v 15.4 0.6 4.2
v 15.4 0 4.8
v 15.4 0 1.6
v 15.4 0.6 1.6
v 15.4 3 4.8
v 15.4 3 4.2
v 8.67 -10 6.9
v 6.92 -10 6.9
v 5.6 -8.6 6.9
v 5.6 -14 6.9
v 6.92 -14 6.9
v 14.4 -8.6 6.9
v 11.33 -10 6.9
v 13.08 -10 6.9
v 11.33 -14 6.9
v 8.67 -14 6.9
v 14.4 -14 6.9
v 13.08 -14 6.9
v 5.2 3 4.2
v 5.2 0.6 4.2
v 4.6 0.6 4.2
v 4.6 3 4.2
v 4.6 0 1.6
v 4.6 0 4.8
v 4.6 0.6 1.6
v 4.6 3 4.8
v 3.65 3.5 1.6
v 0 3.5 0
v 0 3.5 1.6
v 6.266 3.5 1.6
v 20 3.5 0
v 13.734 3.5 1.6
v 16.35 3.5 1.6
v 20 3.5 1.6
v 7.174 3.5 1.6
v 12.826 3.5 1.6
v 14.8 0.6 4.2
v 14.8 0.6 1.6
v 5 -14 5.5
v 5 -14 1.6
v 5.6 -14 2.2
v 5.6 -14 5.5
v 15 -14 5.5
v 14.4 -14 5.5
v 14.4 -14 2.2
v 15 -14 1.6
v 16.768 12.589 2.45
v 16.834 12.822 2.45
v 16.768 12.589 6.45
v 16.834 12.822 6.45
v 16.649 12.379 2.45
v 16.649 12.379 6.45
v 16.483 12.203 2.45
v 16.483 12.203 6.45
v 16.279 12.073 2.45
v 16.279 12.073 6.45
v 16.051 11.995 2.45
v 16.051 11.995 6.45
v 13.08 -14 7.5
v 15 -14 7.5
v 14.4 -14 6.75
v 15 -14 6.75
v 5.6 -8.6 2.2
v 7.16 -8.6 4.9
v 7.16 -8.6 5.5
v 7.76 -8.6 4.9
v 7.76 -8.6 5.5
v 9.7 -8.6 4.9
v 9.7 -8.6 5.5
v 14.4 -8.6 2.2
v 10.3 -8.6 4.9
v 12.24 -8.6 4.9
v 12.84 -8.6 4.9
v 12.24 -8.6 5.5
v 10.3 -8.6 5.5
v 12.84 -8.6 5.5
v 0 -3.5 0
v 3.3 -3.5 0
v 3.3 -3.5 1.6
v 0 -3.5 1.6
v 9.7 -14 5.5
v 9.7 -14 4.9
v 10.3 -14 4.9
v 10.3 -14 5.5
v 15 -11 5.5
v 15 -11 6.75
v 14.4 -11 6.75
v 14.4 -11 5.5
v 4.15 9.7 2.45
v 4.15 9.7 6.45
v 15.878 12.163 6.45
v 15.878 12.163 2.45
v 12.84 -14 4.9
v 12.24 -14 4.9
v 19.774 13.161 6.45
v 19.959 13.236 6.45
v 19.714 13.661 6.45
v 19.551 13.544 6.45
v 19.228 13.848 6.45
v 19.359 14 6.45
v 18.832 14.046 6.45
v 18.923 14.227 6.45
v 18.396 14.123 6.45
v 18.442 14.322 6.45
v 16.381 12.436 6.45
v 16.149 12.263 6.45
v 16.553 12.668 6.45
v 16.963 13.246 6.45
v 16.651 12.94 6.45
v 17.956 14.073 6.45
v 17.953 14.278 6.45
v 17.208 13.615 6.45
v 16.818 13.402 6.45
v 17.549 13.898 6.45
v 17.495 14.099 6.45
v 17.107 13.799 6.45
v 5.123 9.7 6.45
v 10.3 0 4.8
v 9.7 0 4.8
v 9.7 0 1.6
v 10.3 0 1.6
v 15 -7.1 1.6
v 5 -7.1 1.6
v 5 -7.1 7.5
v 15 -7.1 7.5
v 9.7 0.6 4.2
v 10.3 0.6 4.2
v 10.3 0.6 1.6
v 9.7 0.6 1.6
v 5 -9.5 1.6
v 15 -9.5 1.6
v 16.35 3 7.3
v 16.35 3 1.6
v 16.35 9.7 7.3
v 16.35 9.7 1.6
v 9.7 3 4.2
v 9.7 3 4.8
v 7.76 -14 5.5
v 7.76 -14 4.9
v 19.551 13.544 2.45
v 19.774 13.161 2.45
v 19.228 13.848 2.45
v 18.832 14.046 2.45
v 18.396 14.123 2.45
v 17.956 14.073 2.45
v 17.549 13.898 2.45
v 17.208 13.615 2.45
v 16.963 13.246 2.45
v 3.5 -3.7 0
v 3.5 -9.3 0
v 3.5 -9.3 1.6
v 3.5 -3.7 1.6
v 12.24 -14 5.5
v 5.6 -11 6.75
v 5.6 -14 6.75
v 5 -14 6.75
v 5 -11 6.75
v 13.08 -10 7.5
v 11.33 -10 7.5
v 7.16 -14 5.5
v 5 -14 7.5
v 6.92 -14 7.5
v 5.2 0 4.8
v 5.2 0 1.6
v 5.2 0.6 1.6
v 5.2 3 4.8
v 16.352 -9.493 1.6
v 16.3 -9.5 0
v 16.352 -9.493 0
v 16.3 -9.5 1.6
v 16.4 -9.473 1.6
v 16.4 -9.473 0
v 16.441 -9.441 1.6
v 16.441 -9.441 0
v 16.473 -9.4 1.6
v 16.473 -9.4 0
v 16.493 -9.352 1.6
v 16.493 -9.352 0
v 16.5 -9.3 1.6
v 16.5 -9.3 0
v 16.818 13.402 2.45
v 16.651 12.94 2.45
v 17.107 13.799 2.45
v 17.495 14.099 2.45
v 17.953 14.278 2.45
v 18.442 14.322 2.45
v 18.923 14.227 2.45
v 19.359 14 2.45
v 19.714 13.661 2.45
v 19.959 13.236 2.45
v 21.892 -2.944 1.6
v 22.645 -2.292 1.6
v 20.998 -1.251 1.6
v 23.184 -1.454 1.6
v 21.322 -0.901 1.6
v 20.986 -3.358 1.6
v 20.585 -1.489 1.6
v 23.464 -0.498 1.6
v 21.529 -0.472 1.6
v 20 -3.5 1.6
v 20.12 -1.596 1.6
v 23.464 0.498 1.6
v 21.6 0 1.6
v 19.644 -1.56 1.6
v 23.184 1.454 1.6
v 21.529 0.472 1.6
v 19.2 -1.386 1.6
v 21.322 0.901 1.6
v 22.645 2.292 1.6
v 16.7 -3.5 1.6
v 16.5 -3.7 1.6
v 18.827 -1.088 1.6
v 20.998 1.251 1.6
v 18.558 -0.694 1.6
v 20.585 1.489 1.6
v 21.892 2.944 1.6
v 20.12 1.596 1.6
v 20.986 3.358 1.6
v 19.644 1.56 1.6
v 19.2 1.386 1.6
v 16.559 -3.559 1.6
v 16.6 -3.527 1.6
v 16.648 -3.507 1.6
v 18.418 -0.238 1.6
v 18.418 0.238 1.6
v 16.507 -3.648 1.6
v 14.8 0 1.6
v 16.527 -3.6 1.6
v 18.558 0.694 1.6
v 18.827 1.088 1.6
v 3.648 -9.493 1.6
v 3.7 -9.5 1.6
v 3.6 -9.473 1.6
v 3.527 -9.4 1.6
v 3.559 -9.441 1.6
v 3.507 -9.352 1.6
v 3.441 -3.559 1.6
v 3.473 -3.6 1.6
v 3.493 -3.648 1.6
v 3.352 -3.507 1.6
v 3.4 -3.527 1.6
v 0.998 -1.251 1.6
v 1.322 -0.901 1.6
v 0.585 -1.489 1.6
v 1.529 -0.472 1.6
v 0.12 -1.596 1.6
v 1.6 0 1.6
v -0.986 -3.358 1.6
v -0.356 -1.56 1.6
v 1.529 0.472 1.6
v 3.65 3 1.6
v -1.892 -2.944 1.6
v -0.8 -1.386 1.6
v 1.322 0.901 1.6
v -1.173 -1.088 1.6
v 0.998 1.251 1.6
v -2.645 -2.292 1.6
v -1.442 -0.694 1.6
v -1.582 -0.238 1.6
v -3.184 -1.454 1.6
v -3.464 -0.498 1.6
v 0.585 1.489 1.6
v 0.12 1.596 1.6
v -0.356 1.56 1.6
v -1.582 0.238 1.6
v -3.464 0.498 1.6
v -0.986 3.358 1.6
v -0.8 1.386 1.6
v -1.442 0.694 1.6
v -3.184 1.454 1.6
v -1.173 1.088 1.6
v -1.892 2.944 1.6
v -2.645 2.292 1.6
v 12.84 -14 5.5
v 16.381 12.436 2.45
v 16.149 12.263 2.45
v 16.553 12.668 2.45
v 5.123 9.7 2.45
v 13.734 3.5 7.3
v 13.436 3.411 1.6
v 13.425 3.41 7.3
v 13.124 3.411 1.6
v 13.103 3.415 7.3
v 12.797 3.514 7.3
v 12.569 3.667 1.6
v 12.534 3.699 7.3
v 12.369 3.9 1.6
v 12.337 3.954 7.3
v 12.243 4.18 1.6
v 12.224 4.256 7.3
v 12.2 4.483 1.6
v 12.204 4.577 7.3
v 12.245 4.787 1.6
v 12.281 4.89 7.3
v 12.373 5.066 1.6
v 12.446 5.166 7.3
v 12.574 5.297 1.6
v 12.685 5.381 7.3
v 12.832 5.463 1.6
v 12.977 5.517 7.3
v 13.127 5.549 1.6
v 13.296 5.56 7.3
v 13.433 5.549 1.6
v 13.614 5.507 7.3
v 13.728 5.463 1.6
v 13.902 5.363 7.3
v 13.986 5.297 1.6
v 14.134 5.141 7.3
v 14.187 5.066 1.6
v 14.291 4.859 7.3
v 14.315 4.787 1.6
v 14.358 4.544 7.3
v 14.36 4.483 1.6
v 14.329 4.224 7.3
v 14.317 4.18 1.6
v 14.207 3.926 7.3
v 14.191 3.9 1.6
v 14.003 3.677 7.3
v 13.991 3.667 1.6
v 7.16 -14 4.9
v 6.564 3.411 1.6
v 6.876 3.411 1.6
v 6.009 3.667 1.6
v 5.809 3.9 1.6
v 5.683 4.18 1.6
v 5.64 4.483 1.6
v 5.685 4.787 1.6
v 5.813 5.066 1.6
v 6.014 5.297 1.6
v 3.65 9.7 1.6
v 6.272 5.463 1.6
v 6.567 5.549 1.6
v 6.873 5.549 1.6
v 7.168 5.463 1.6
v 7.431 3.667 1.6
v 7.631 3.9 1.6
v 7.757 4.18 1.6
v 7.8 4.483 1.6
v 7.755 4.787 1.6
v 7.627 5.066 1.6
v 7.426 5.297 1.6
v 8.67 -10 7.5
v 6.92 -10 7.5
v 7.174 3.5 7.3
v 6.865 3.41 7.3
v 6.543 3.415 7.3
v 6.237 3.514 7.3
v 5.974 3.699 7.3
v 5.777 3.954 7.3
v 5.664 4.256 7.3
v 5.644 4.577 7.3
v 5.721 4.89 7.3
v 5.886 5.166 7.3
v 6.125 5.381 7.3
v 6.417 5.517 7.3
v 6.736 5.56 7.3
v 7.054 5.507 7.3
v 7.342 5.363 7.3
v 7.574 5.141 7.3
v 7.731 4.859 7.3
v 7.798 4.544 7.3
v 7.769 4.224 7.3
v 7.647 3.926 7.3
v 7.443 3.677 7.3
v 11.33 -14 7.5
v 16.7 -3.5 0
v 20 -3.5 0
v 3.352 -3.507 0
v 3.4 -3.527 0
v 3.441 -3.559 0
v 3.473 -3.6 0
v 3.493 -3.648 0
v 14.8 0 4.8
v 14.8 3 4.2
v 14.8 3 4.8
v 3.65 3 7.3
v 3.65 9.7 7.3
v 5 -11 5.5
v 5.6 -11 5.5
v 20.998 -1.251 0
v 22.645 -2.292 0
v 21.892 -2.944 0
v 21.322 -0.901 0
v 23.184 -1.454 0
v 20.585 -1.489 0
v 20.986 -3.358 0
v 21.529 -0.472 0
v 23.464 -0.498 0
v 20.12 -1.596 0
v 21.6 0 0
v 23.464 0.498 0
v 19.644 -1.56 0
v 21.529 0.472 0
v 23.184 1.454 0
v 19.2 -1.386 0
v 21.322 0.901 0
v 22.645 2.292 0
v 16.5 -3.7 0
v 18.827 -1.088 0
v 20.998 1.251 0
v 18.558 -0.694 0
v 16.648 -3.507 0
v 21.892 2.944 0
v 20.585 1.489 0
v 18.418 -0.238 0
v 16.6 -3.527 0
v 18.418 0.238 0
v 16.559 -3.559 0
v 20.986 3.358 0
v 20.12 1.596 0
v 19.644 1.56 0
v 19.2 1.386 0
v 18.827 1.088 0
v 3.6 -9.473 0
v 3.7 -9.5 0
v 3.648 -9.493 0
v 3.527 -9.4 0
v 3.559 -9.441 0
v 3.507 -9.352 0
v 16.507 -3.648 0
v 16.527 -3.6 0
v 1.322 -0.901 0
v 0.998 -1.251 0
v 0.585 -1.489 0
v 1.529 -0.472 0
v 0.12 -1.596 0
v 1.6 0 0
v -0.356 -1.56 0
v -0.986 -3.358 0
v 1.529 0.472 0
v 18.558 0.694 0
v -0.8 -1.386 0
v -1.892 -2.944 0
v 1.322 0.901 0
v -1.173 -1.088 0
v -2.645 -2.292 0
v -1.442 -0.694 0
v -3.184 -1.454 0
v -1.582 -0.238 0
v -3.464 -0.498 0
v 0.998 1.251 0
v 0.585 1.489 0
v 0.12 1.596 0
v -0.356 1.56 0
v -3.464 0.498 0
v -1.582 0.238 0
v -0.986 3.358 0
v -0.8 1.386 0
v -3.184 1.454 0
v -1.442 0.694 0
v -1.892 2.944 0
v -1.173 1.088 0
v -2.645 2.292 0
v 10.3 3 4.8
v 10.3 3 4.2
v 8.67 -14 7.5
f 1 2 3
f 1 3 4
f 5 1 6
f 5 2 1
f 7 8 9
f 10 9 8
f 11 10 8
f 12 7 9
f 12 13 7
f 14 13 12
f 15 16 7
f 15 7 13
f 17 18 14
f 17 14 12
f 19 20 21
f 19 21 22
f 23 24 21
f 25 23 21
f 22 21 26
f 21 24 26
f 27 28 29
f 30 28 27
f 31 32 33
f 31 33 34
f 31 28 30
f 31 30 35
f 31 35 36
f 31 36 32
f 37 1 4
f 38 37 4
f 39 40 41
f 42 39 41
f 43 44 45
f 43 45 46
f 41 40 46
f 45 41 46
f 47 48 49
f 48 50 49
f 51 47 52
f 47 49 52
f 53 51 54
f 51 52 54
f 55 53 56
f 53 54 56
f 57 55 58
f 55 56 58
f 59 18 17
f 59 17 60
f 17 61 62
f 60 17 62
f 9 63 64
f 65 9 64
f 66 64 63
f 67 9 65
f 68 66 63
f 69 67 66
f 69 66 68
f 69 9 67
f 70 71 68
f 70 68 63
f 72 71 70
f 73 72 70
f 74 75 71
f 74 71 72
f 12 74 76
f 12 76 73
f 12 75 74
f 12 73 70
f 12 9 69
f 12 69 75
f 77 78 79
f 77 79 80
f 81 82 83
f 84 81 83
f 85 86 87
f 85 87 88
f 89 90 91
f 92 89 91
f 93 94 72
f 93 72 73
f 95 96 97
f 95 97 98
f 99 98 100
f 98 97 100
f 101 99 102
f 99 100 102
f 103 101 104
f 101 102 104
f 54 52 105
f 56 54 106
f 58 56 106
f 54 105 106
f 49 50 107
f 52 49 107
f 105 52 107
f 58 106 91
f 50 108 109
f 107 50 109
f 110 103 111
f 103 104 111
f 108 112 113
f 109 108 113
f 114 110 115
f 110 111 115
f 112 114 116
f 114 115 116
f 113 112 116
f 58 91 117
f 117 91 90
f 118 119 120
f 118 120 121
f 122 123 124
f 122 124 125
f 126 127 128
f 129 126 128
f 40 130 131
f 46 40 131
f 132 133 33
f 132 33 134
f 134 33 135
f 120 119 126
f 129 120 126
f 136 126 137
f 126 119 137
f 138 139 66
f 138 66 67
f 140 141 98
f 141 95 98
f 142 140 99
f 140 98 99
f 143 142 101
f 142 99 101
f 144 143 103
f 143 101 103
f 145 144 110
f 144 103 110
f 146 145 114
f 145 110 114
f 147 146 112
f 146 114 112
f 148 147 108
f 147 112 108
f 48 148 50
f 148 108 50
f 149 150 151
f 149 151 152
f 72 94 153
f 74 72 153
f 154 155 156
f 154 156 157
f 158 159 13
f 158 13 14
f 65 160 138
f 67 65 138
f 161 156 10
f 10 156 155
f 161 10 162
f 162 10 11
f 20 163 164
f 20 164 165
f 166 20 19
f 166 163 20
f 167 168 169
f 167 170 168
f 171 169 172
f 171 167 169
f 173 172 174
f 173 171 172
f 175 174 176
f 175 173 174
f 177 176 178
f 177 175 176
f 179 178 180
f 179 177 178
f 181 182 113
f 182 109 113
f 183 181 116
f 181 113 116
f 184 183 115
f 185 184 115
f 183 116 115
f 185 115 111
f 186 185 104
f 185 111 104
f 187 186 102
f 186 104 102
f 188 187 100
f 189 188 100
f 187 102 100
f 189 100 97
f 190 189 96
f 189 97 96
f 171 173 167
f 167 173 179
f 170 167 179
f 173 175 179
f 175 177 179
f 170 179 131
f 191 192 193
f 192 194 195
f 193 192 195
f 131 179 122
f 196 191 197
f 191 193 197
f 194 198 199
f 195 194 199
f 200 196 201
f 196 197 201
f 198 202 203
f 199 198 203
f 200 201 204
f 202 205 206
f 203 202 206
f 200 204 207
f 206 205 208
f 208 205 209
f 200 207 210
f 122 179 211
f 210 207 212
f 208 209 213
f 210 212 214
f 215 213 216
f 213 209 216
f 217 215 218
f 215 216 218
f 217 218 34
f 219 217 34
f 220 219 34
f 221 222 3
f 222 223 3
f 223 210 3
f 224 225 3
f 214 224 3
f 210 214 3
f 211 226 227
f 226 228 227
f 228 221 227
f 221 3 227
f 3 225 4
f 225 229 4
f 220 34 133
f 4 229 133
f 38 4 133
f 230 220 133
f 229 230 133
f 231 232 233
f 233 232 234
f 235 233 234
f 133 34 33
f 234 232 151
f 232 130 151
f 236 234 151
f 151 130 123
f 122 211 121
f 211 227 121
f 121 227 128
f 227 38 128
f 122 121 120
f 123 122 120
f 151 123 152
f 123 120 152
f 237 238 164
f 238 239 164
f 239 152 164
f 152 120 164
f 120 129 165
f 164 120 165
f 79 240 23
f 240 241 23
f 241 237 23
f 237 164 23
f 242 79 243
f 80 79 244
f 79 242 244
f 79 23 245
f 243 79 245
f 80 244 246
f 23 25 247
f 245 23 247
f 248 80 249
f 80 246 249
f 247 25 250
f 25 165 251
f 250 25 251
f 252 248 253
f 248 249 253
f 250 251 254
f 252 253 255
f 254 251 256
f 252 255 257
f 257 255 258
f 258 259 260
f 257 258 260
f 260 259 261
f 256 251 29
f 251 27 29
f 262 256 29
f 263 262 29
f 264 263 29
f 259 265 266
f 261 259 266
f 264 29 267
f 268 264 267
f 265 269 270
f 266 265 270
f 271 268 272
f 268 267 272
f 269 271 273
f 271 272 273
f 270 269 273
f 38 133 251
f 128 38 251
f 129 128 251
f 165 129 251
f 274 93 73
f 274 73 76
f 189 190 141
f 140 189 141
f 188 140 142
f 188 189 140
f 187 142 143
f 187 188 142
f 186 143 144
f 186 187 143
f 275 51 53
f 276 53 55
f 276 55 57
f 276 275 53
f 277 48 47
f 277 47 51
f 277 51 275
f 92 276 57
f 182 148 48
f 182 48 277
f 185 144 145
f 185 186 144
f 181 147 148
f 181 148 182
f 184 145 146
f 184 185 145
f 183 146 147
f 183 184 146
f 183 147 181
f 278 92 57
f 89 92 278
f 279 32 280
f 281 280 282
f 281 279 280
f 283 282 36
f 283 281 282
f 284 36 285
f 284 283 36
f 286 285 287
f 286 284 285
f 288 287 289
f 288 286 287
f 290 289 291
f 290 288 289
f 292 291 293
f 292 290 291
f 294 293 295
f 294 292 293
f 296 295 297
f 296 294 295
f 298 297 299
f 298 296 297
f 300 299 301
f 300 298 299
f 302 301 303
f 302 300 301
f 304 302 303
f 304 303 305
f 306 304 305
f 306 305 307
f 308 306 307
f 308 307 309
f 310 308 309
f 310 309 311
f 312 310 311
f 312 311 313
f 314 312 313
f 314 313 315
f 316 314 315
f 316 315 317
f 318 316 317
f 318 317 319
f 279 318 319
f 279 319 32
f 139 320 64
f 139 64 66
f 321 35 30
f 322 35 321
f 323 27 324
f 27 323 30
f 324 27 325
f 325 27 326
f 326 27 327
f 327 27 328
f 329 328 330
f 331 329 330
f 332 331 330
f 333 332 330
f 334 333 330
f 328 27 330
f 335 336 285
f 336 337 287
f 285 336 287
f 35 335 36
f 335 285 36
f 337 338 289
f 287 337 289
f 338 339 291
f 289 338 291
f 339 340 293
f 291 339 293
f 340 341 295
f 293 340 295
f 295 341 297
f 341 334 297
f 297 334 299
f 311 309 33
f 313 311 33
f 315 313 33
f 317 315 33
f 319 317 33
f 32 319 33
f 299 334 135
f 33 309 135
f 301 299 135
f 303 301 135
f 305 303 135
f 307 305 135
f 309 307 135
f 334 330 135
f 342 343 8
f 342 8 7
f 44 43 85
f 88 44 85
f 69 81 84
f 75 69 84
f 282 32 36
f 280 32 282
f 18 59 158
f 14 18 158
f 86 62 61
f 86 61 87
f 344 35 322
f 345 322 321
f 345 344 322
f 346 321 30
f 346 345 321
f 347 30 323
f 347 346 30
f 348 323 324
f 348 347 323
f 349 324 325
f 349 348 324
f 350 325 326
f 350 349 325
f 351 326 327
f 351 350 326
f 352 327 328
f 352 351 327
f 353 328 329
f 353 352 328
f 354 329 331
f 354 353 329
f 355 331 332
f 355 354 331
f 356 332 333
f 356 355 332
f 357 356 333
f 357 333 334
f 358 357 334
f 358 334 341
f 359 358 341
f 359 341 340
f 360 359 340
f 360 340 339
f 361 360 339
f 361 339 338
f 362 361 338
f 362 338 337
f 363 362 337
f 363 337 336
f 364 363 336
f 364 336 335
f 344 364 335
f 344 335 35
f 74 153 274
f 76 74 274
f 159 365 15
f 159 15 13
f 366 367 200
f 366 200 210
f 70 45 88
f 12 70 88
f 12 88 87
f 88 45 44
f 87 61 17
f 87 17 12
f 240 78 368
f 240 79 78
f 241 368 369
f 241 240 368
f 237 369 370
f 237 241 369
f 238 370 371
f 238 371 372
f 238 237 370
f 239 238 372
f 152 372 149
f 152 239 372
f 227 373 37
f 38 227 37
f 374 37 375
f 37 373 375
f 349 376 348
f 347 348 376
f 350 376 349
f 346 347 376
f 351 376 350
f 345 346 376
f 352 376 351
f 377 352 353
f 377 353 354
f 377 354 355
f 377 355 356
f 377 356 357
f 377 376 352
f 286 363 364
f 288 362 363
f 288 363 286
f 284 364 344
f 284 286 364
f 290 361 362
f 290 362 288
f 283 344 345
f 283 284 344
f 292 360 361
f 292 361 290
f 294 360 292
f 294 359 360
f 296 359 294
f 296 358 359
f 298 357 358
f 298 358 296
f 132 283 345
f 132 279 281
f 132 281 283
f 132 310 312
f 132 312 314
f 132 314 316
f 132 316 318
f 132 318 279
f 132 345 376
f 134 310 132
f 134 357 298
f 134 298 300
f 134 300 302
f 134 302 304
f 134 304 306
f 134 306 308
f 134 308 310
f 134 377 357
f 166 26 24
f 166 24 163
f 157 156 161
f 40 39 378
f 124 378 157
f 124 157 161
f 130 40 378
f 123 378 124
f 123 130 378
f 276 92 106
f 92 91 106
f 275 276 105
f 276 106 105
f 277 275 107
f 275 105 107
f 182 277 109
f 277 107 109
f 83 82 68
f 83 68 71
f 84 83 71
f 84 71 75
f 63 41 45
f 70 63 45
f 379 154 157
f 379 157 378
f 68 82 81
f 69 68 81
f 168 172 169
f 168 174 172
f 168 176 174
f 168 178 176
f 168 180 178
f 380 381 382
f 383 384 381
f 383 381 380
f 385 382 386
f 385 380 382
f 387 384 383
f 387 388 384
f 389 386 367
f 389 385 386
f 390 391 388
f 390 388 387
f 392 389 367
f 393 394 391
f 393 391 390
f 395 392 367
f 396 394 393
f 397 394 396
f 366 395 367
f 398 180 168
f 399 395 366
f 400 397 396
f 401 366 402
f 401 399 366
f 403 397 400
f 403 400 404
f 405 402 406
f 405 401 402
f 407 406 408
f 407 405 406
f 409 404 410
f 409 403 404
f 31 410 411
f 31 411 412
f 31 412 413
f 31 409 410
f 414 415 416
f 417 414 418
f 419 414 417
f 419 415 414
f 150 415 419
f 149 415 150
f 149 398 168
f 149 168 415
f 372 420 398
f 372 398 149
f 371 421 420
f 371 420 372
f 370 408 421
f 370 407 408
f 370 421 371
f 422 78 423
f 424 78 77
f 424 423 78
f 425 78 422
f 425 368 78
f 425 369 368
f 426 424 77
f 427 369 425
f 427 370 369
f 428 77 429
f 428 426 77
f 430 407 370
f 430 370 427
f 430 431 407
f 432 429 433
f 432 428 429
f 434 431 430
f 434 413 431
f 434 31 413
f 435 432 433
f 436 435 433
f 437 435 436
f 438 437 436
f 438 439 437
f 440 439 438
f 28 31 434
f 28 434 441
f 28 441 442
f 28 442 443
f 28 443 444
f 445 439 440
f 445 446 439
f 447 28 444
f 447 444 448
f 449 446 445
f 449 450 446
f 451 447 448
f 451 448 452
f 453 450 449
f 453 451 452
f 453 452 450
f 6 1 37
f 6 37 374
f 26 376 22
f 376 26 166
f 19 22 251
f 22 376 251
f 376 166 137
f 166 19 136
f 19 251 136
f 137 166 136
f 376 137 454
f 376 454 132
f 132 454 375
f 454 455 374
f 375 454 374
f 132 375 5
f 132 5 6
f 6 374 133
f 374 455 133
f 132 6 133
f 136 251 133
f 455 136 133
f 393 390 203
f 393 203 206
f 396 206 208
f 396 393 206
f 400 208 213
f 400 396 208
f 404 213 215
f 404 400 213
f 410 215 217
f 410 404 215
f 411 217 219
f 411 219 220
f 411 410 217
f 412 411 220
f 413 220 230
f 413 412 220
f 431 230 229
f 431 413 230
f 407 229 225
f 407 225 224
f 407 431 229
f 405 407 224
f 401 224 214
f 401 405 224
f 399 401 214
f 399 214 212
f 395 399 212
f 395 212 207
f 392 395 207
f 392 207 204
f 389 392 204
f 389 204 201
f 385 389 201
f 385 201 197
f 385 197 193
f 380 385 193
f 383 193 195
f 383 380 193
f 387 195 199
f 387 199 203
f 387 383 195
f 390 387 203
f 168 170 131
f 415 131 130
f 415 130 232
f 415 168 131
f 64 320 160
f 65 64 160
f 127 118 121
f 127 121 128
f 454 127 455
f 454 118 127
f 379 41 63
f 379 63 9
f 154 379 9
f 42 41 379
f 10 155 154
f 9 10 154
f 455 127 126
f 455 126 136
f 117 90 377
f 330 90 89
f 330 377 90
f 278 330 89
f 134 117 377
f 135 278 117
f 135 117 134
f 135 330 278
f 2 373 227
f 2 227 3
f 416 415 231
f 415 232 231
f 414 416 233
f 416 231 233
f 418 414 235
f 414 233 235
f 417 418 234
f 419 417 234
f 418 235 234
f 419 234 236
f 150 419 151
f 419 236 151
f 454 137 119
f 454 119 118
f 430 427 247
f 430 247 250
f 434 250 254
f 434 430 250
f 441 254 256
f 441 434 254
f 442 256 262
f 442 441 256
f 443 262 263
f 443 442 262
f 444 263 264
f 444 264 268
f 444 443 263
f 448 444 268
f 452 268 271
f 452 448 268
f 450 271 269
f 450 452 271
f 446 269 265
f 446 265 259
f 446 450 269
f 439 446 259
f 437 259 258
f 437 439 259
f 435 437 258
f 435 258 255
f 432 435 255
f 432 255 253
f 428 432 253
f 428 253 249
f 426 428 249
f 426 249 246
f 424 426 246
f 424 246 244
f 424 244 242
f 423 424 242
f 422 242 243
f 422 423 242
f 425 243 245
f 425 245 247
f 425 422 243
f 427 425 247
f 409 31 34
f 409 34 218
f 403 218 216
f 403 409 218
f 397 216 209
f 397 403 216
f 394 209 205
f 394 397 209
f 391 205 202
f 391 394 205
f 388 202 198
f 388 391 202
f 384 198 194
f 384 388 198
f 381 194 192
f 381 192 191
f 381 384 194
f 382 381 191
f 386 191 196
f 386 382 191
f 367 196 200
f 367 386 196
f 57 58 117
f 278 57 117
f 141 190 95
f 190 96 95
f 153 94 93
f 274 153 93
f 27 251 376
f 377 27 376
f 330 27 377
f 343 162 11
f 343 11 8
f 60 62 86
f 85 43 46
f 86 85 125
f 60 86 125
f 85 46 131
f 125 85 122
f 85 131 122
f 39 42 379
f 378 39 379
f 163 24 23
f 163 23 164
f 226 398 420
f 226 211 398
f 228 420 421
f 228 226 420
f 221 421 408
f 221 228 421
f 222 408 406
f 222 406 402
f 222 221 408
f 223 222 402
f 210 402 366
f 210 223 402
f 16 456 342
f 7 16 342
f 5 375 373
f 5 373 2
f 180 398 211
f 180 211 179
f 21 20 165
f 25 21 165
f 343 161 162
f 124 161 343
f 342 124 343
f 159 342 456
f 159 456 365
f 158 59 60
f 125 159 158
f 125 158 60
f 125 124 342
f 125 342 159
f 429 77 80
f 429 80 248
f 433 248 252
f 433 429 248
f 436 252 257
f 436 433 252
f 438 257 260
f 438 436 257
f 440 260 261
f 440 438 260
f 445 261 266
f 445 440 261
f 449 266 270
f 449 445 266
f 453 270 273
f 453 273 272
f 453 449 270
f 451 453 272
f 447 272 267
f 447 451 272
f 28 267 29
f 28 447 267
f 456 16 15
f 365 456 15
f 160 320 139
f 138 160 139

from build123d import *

# Parameters (mm, degrees)
SKICA1_R                 = 1.6
P_IDAT_VYSUNUT_M1_DEPTH  = 1.6
SKICA2_W                 = 12.7
SKICA2_H                 = 6.7
P_IDAT_VYSUNUT_M2_DEPTH  = 5.7
SKICA3_W                 = 10
SKICA3_H                 = 6.9
P_IDAT_VYSUNUT_M3_DEPTH  = 5.9
SKICA4_W                 = 8.8
SKICA4_H                 = 4.7
SKICA4_W_2               = 0.6
SKICA4_H_2               = 0.6
ODEBRAT_VYSUNUT_M1_DEPTH = 5.4
SKICA5_W                 = 1.25
SKICA5_H                 = 3
ODEBRAT_VYSUNUT_M2_DEPTH = 11.4
SKICA6_W                 = 1.75
SKICA6_H                 = 4
ODEBRAT_VYSUNUT_M3_DEPTH = 1
ZAOBLIT1_R               = 0.2
SKICA8_R                 = 1.08
ODEBRAT_VYSUNUT_M4_DEPTH = 5.7
P_IDAT_VYSUNUT_M4_DEPTH  = 2
SKICA16_W                = 0.6
SKICA16_H                = 3
P_IDAT_VYSUNUT_M5_DEPTH  = 3.2
SKICA17_W                = 2.6
SKICA17_H                = 2.4
ODEBRAT_VYSUNUT_M6_DEPTH = 12


with BuildPart() as part:
    # Skica1 → Přidat vysunutím1 (new body)
    with BuildSketch(Plane.XY):
        with BuildLine():
            Line((0, 3.5), (20, 3.5))
            ThreePointArc((20, 3.5), (23.5, 0), (20, -3.5))
            Line((20, -3.5), (16.5, -3.5))
            Line((16.5, -3.5), (16.5, -9.5))
            Line((16.5, -9.5), (3.5, -9.5))
            Line((3.5, -9.5), (3.5, -3.5))
            Line((3.5, -3.5), (0, -3.5))
            ThreePointArc((0, -3.5), (-3.5, 0), (0, 3.5))
        make_face()
        Circle(SKICA1_R, mode=Mode.SUBTRACT)
        with Locations((20, 0)):
            Circle(SKICA1_R, mode=Mode.SUBTRACT)
    extrude(amount=P_IDAT_VYSUNUT_M1_DEPTH)

    # Skica2 → Přidat vysunutím2 (add)
    with BuildSketch(Plane.XY.offset(1.6)):
        with Locations((10, 6.35)):
            Rectangle(SKICA2_W, SKICA2_H)
    extrude(amount=P_IDAT_VYSUNUT_M2_DEPTH)

    # Skica3 → Přidat vysunutím3 (add)
    with BuildSketch(Plane.XY.offset(1.6)):
        with Locations((10, -10.55)):
            Rectangle(SKICA3_W, SKICA3_H)
    extrude(amount=P_IDAT_VYSUNUT_M3_DEPTH)

    # Skica4 → Odebrat vysunutím1 (cut)
    with BuildSketch(Plane.XZ.offset(14)):
        with Locations((10, 4.55)):
            Rectangle(SKICA4_W, SKICA4_H)
        with Locations((10, 5.2)):
            Rectangle(SKICA4_W_2, SKICA4_H_2, mode=Mode.SUBTRACT)
        with Locations((7.46, 5.2)):
            Rectangle(SKICA4_W_2, SKICA4_H_2, mode=Mode.SUBTRACT)
        with Locations((12.54, 5.2)):
            Rectangle(SKICA4_W_2, SKICA4_H_2, mode=Mode.SUBTRACT)
    extrude(amount=-ODEBRAT_VYSUNUT_M1_DEPTH, mode=Mode.SUBTRACT)

    # Skica5 → Odebrat vysunutím2 (cut)
    with BuildSketch(Plane(origin=(15, 0, 0), x_dir=(0, 0, -1), z_dir=(1, 0, 0))):
        with Locations((-6.125, -12.5)):
            Rectangle(SKICA5_W, SKICA5_H)
    extrude(amount=-ODEBRAT_VYSUNUT_M2_DEPTH, mode=Mode.SUBTRACT)

    # Skica6 → Odebrat vysunutím3 (cut)
    with BuildSketch(Plane.XY.offset(7.5)):
        with Locations((12.205, -12)):
            Rectangle(SKICA6_W, SKICA6_H)
        with Locations((7.795, -12)):
            Rectangle(SKICA6_W, SKICA6_H)
    extrude(amount=-ODEBRAT_VYSUNUT_M3_DEPTH, mode=Mode.SUBTRACT)

    # Zaoblit1
    zaoblit1_edges = [part.edges().sort_by_distance(p)[0] for p in [
        (16.5, -3.5, 0.8),
        (16.5, -9.5, 0.8),
        (3.5, -9.5, 0.8),
        (3.5, -3.5, 0.8),
    ]]
    fillet(zaoblit1_edges, radius=ZAOBLIT1_R)

    # Skica8 → Odebrat vysunutím4 (cut)
    with BuildSketch(Plane(origin=(0, -2.8, 7.3), x_dir=(1, 0, 0), z_dir=(0, 0, -1))):
        with Locations(Location((6.72, -7.28, 0), (0, 0, 65.14949766))):
            Circle(SKICA8_R)
        with Locations(Location((13.28, -7.28, 0), (0, 0, 65.14949766))):
            Circle(SKICA8_R)
    extrude(amount=ODEBRAT_VYSUNUT_M4_DEPTH, mode=Mode.SUBTRACT)

    # Skica15 → Přidat vysunutím4 (add, symmetric)
    with BuildSketch(Plane.XY.offset(4.45)):
        with BuildLine():
            Line((4.15, 9.7), (15.877570704, 12.162837052))
            ThreePointArc((15.877570704, 12.162837052), (16.38053334, 12.435762524), (16.651496116, 12.939785241))
            ThreePointArc((16.651496116, 12.939785241), (18.195492273, 14.317249988), (19.959455422, 13.23569219))
            Line((19.959455422, 13.23569219), (19.773836138, 13.161224202))
            ThreePointArc((19.773836138, 13.161224202), (18.174243185, 14.114045924), (16.833517959, 12.822139302))
            ThreePointArc((16.833517959, 12.822139302), (16.571348331, 12.286093255), (16.05055336, 11.994801518))
            Line((16.05055336, 11.994801518), (5.123136532, 9.7))
            Line((5.123136532, 9.7), (4.15, 9.7))
        make_face()
    extrude(amount=P_IDAT_VYSUNUT_M4_DEPTH, both=True)

    # Skica16 → Přidat vysunutím5 (add)
    with BuildSketch(Plane.XY.offset(4.8)):
        with Locations((4.9, 1.5)):
            Rectangle(SKICA16_W, SKICA16_H)
        with Locations((10, 1.5)):
            Rectangle(SKICA16_W, SKICA16_H)
        with Locations((15.1, 1.5)):
            Rectangle(SKICA16_W, SKICA16_H)
    extrude(amount=-P_IDAT_VYSUNUT_M5_DEPTH)

    # Skica17 → Odebrat vysunutím6 (cut)
    with BuildSketch(Plane(origin=(15.4, 0, 0), x_dir=(0, 0, -1), z_dir=(1, 0, 0))):
        with Locations((-2.9, 1.8)):
            Rectangle(SKICA17_W, SKICA17_H)
    extrude(amount=-ODEBRAT_VYSUNUT_M6_DEPTH, mode=Mode.SUBTRACT)


solid = part.part
